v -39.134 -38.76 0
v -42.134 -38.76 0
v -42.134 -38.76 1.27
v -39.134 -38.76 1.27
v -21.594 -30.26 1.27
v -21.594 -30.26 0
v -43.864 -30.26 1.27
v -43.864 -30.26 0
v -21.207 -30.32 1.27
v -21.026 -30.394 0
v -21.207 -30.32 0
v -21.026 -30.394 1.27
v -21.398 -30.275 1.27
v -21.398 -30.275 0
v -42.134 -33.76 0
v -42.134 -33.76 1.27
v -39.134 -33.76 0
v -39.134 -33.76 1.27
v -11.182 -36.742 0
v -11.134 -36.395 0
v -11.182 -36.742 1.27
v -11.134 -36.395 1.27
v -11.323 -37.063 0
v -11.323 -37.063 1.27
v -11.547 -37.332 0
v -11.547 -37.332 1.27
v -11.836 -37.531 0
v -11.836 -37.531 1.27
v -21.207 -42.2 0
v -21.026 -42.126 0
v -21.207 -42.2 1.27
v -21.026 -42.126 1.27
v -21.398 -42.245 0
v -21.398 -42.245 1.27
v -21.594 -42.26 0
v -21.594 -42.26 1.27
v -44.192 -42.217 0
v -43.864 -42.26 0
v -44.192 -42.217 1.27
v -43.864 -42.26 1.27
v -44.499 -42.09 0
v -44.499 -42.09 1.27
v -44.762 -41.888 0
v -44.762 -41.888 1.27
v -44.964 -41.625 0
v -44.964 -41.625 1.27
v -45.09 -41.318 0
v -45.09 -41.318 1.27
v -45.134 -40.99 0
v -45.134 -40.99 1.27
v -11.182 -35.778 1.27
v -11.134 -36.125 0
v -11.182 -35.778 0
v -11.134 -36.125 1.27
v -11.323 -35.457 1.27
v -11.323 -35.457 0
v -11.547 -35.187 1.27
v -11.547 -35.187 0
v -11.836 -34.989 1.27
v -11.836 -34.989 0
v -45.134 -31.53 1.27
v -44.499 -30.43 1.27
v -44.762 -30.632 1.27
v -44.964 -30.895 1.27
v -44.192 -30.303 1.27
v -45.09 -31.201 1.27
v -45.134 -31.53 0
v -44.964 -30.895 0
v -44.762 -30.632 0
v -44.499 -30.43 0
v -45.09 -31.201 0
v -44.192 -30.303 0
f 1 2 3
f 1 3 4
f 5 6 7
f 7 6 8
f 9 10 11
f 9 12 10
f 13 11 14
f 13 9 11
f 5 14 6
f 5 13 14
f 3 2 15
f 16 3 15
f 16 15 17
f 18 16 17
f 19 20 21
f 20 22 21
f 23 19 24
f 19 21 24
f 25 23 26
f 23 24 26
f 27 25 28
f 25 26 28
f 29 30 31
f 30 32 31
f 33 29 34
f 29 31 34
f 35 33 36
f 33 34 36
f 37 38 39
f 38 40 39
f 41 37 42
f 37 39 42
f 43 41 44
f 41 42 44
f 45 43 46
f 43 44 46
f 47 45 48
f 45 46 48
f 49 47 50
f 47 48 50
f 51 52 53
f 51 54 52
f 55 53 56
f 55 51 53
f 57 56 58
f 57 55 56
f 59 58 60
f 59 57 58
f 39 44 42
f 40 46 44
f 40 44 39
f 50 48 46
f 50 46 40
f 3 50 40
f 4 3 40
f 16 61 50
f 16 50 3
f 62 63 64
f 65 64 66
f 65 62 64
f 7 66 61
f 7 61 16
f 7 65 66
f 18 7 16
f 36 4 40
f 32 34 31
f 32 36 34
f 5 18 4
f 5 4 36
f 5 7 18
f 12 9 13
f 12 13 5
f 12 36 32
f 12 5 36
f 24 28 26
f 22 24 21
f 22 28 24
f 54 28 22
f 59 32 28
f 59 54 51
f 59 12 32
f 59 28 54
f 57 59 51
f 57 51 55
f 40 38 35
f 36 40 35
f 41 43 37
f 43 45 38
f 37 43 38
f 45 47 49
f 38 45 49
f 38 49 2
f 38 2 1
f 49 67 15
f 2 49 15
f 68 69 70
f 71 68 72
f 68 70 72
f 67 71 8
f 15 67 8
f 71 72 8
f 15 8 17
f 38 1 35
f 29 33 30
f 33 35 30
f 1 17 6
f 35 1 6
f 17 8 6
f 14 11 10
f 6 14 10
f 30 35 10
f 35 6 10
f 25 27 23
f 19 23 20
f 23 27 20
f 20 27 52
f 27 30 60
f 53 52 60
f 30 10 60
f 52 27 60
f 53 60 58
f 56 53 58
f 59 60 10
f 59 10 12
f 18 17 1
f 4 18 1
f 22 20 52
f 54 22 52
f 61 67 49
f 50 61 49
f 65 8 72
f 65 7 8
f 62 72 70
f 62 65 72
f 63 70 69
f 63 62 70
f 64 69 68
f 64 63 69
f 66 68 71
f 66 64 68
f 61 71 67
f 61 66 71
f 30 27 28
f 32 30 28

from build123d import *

# Parameters (mm, degrees)
F0_W       = 3
F0_H       = 3.5
F0_W_2     = 25
F0_H_2     = 12
F1_DEPTH   = 1.27
F2_SIZE2   = 5.08
F2_SIZE    = 10.16
F2_2_SIZE2 = 5.08
F2_2_SIZE  = 10.16
F3_R       = 1.27
F4_R       = 1.27


with BuildPart() as f1:
    # F0 (on Top) → F1 (new body)
    with BuildSketch(Plane.XY):
        Polygon((-42.1337384582, -30.2597887341), (-45.1337384582, -30.2597887341), (-45.1337384582, -42.2597887341), (-42.1337384582, -42.2597887341), (-42.1337384582, -38.7597887341), (-42.1337384582, -33.7597887341), align=None)
        with Locations((-40.6337384582, -32.0097887341)):
            Rectangle(F0_W, F0_H)
        with Locations((-40.6337384582, -40.5097887341)):
            Rectangle(F0_W, F0_H)
        Polygon((-36.1337384582, -30.2597887341), (-39.1337384582, -30.2597887341), (-39.1337384582, -33.7597887341), (-39.1337384582, -38.7597887341), (-39.1337384582, -42.2597887341), (-36.1337384582, -42.2597887341), align=None)
        with Locations((-23.6337384582, -36.2597887341)):
            Rectangle(F0_W_2, F0_H_2)
    extrude(amount=F1_DEPTH)

    # F2
    f2_edges = [f1.edges().sort_by_distance(p)[0] for p in [
        (-11.133738, -30.259789, 0.635),
    ]]
    f2_side = f1.faces().sort_by_distance((-28.133738, -30.259789, 0.635))[0]
    chamfer(f2_edges, length=F2_SIZE, length2=F2_SIZE2, reference=f2_side)

    # F2#2
    f2_2_edges = [f1.edges().sort_by_distance(p)[0] for p in [
        (-11.133738, -42.259789, 0.635),
    ]]
    f2_2_side = f1.faces().sort_by_distance((-28.133738, -42.259789, 0.635))[0]
    chamfer(f2_2_edges, length=F2_2_SIZE, length2=F2_2_SIZE2, reference=f2_2_side)

    # F3
    f3_edges = [f1.edges().sort_by_distance(p)[0] for p in [
        (-21.293738, -30.259789, 0.635),
        (-11.133738, -35.339789, 0.635),
        (-11.133738, -37.179789, 0.635),
        (-21.293738, -42.259789, 0.635),
    ]]
    fillet(f3_edges, radius=F3_R)

    # F4
    f4_edges = [f1.edges().sort_by_distance(p)[0] for p in [
        (-45.133738, -42.259789, 0.635),
        (-45.133738, -30.259789, 0.635),
    ]]
    fillet(f4_edges, radius=F4_R)


solid = f1.part
